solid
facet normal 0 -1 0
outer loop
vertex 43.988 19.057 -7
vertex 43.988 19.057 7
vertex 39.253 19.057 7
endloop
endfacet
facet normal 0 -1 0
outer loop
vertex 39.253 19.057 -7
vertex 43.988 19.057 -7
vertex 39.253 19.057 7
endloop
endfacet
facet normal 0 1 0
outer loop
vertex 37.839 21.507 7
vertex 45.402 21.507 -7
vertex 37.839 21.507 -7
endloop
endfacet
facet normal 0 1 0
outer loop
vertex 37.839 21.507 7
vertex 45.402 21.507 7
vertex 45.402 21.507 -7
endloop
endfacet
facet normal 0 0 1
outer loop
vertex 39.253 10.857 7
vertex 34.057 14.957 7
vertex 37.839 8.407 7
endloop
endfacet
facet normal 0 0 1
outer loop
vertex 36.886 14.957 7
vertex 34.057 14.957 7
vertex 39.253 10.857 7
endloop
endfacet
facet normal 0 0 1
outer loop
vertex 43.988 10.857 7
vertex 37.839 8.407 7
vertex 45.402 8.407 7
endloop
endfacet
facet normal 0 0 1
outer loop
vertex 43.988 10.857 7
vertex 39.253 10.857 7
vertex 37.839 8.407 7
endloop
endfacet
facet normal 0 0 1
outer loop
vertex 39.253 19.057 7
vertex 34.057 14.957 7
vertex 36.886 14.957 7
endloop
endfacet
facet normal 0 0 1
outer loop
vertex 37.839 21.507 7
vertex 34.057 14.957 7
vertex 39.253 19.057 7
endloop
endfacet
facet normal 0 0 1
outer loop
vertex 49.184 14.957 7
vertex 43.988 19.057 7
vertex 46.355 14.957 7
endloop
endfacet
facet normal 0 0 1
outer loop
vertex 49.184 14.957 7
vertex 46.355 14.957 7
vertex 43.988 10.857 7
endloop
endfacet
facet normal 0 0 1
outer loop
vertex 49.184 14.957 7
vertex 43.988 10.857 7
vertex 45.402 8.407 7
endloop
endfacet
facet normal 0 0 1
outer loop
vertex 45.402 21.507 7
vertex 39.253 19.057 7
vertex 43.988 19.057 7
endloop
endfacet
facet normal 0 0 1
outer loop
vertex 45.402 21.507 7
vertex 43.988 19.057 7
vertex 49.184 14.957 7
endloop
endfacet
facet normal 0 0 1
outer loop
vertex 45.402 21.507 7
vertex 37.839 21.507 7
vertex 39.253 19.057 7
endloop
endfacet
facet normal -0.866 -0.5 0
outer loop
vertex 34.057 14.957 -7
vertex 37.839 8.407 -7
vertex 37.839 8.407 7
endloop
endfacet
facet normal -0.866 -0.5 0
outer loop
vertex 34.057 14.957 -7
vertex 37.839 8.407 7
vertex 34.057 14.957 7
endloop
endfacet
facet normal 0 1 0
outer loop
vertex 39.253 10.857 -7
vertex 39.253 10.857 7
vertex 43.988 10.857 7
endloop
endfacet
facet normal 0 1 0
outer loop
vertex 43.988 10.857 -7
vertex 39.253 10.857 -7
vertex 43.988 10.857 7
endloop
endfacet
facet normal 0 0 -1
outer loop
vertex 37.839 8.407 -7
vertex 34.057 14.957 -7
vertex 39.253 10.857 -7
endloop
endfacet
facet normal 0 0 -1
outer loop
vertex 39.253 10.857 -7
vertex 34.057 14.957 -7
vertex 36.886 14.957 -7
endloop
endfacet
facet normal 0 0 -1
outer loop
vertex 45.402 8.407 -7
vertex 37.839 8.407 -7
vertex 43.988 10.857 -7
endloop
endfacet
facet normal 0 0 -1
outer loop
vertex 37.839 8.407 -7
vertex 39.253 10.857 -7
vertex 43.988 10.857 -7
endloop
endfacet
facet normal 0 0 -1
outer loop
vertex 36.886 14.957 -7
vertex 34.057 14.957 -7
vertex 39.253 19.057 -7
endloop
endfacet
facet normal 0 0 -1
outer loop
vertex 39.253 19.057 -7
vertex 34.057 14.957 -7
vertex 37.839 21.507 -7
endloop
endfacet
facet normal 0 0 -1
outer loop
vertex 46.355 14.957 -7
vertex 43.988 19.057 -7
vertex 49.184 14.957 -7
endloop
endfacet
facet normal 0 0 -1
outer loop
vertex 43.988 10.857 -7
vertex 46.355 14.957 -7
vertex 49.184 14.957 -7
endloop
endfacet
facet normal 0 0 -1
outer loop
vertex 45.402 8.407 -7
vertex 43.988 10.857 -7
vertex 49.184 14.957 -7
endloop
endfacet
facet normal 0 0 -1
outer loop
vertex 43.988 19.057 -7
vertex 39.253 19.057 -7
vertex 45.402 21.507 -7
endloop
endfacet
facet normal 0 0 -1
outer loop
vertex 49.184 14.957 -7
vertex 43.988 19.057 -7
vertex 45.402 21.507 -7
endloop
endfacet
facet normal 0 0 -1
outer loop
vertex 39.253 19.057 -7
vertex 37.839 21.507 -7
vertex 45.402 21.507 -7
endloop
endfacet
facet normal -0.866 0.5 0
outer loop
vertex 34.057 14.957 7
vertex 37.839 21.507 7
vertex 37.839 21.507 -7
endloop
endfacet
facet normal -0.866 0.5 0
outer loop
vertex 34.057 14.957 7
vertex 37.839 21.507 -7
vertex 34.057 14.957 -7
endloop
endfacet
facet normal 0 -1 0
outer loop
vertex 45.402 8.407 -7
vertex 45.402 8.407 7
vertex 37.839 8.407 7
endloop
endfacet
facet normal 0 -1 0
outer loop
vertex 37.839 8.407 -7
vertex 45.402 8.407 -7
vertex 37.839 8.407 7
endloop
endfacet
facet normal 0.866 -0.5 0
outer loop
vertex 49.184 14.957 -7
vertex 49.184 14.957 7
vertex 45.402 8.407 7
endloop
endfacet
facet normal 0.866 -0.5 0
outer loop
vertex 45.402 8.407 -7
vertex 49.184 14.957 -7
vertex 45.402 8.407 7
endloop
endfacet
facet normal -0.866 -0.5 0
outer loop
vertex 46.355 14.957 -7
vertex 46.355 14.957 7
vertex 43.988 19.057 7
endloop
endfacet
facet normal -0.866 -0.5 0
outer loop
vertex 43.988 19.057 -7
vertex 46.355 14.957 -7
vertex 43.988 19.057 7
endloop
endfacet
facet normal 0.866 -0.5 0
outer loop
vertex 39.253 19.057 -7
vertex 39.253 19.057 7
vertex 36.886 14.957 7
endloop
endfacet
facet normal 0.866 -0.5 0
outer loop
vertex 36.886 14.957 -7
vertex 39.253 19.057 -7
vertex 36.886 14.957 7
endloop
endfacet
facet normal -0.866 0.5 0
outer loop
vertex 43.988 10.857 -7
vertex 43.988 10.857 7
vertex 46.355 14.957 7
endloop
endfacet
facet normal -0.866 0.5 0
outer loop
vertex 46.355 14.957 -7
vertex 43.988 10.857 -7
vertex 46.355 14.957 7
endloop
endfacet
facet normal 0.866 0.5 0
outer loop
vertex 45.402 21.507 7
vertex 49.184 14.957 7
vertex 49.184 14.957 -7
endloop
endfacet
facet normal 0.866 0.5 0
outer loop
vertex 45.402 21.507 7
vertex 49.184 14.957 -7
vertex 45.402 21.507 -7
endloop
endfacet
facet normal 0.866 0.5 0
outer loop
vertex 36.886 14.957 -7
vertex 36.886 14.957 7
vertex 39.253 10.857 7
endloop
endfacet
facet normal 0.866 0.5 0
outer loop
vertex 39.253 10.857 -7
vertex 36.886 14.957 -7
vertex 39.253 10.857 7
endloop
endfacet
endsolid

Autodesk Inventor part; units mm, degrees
ref_plane "YZ Plane" through (0, 0, 0) normal (1, 0, 0) x (0, 1, 0)
sketch "Skizze1" plane through (0, 0, 0) normal (0, 0, 1) x (1, 0, 0)
  circle A0 centre (13.3363, -13.3273) radius 2.25 projected
  circle A1 centre (69.9048, -13.3273) radius 2.25 projected
  line L0 (49.1839, 14.957) -> (45.4022, 8.407) projected
  line L1 (45.4022, 8.407) -> (37.8389, 8.407) projected
  line L2 (37.8389, 8.407) -> (34.0573, 14.957) projected
  circle A2 centre (-86.3794, -2.543) radius 2.1 projected
  line L3 (-65.3794, -2.3212) -> (-80.3794, -2.3212) projected
  line L4 (-80.3794, -2.3212) -> (-80.3794, 8.457) projected
  line L5 (-80.3794, 8.457) -> (-86.3794, 8.457) projected
  line L6 (-86.3794, 8.457) -> (-86.3794, 3.857) projected
  line L7 (-86.3794, 3.857) -> (-93.3794, 3.857) projected
  line L8 (-93.3794, 3.857) -> (-93.3794, 8.457) projected
  line L9 (-93.3794, 8.457) -> (-98.3794, 8.457) projected
  line L10 (-98.3794, 8.457) -> (-98.3794, -15.043) projected
  line L11 (-38.3794, -15.043) -> (-98.3794, -15.043) projected
  spline S0 degree 3 poles (16.2456, -28.9938) (-0.41, -19.3777) (-19.1473, -15.043) (-38.3794, -15.043) knots 1 1 1 1 2 2 2 2 projected
  arc A3 (16.2456, -28.9938) -> (92.3706, 14.957) centre (41.6206, 14.957) ccw projected
  line L12 (-93.3794, 21.457) -> (-98.3794, 21.457) projected
  line L13 (-93.3794, 21.457) -> (-93.3794, 26.057) projected
  line L14 (-93.3794, 26.057) -> (-86.3794, 26.057) projected
  line L15 (-86.3794, 26.057) -> (-86.3794, 21.457) projected
  line L16 (-86.3794, 21.457) -> (-80.3794, 21.457) projected
  line L17 (-80.3794, 32.2352) -> (-80.3794, 21.457) projected
  line L18 (-65.3794, -4.043) -> (-65.3794, -2.3212) projected
  line L19 (26.6206, 28.1857) -> (26.6206, 1.7282) projected
  line L20 (26.6206, 1.7282) -> (16.7234, -4.043) projected
  line L21 (16.7234, -4.043) -> (-65.3794, -4.043) projected
  circle A4 centre (41.6206, 14.957) radius 4.1 construction
  line L22 (46.3548, 14.957) -> (43.9877, 19.057)
  line L23 (43.9877, 19.057) -> (39.2534, 19.057)
  line L24 (39.2534, 19.057) -> (36.8863, 14.957)
  line L25 (36.8863, 14.957) -> (39.2534, 10.857)
  line L26 (39.2534, 10.857) -> (43.9877, 10.857)
  line L27 (43.9877, 10.857) -> (46.3548, 14.957)
  arc A5 (92.3706, 14.957) -> (16.2456, 58.9078) centre (41.6206, 14.957) ccw projected
  spline S1 degree 3 poles (16.2456, 58.9078) (-0.41, 49.2917) (-19.1473, 44.957) (-38.3794, 44.957) knots 1 1 1 1 2 2 2 2 projected
  line L28 (-38.3794, 44.957) -> (-98.3794, 44.957) projected
  line L29 (-98.3794, 21.457) -> (-98.3794, 44.957) projected
  line L30 (-65.3794, 32.2352) -> (-80.3794, 32.2352) projected
  line L31 (-65.3794, 33.957) -> (-65.3794, 32.2352) projected
  line L32 (16.7234, 33.957) -> (-65.3794, 33.957) projected
  line L33 (26.6206, 28.1857) -> (16.7234, 33.957) projected
  circle A6 centre (13.3363, 43.2412) radius 2.25 projected
  circle A7 centre (69.9048, 43.2412) radius 2.25 projected
  circle A8 centre (-86.3794, 32.457) radius 2.1 projected
  line L34 (37.8389, 21.507) -> (34.0573, 14.957) projected
  line L35 (45.4022, 21.507) -> (37.8389, 21.507) projected
  line L36 (49.1839, 14.957) -> (45.4022, 21.507) projected
  point P0 (0, 0)
  dimension "d0" = 8.2
ref_plane "Arbeitsebene1" through (35.8206, 9.157, 7) normal (0, 0, -1) x (0, 1, 0)
ref_plane "Arbeitsebene2" through (35.8206, 9.157, -7) normal (0, 0, 1) x (1, 0, 0)
extrude "Extrusion1" add sketch "Skizze1" against normal up to surface (14 mm away) from surface at 7 contours L0 L1 L2 L34 L35 L36
properties part number "Nutspacker" material "ABS-Kunststoff - Schwarz"
